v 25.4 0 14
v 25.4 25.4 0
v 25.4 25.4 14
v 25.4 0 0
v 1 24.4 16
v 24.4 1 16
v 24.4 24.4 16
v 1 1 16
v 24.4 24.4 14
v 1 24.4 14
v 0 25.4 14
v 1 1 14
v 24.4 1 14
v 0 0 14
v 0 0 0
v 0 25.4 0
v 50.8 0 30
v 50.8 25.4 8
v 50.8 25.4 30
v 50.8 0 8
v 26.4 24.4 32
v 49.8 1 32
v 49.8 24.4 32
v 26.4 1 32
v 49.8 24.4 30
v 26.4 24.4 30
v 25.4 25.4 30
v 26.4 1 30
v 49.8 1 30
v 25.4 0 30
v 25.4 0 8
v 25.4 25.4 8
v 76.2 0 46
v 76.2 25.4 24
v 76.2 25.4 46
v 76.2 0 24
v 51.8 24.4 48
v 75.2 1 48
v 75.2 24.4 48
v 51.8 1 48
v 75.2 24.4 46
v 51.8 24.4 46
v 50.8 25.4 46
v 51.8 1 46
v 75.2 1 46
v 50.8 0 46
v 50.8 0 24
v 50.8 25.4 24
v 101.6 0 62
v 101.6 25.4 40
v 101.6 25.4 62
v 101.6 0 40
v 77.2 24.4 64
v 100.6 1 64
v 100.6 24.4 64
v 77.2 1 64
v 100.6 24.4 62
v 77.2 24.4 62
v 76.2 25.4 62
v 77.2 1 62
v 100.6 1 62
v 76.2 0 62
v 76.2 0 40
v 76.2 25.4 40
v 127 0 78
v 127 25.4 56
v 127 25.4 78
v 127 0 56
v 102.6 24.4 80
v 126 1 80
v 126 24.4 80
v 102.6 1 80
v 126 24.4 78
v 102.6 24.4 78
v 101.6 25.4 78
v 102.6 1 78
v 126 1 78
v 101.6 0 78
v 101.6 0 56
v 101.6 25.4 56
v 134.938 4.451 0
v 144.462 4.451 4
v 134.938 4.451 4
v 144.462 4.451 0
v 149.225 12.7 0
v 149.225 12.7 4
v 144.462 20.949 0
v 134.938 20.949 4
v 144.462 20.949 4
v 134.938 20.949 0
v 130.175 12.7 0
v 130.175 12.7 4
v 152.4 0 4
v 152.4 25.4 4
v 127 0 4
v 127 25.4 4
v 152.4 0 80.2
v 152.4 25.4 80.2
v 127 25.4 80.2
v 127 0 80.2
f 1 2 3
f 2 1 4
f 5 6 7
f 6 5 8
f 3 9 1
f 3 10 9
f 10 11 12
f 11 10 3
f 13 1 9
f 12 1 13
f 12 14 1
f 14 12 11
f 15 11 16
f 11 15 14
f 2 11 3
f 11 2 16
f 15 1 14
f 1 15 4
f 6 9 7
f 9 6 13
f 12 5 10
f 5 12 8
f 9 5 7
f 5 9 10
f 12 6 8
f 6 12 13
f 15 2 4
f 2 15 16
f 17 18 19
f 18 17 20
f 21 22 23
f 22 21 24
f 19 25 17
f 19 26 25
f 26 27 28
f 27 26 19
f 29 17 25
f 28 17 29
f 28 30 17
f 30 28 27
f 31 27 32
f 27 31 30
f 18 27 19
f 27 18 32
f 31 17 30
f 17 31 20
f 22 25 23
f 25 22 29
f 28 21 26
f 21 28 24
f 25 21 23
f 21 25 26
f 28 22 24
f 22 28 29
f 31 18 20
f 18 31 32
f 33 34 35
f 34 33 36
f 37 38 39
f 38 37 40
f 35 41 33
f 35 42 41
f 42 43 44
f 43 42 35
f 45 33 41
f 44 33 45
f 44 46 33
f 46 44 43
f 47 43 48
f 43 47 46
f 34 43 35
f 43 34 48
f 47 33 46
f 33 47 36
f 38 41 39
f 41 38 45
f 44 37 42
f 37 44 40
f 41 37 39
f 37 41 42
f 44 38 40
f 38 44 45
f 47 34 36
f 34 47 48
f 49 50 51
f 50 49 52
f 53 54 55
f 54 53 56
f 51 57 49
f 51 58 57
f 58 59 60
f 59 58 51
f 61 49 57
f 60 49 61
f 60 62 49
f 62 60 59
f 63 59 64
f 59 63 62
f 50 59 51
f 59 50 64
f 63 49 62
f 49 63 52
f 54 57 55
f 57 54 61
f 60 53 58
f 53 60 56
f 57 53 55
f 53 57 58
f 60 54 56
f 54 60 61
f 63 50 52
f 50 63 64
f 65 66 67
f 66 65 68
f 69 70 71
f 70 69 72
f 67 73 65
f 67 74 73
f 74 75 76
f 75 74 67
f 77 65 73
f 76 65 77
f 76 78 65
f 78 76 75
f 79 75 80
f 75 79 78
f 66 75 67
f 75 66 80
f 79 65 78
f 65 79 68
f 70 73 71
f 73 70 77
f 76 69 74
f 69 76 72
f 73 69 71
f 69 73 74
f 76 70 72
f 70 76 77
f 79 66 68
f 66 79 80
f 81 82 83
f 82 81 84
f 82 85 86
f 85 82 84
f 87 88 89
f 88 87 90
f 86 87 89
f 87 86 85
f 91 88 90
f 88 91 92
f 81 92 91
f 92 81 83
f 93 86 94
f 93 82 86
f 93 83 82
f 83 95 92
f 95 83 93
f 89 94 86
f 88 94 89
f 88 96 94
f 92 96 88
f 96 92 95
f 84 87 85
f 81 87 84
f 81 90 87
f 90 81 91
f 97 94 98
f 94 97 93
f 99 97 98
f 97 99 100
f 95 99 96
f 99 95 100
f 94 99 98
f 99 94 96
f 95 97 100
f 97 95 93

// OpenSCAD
// file: ../DND Play Area Tiles.scad
/**
 * @brief This file contains various types of tiles and other modules for non-assembled/arranged pieces
 * TODO Add textures to tiles
 * TODO Tile square module
 * TODO Tile circle module
 * TODO Basic tile replacement module
 * TODO Wall modules
 */

include <DND Play Area Config.scad>;

/**
 * @brief Basic tile to use for floors
 * @param _center Whether or not to center the tile
 */
module basic_tile(_center=false, _thickness=1) {
    if (DIP_OUTSIDE_SQUARE) {
        difference() {
            // Main tile piece
            cube([SQUARE_SIZE+DIP_DIMENSIONS,SQUARE_SIZE+DIP_DIMENSIONS,TILE_THICKNESS*_thickness],_center);
            // Tile dip
            translate([0,0,(TILE_THICKNESS*_thickness)-DIP_DIMENSIONS])
                difference() {
                    cube([SQUARE_SIZE+DIP_DIMENSIONS,SQUARE_SIZE+DIP_DIMENSIONS,DIP_DIMENSIONS],_center);
                translate([DIP_DIMENSIONS/2,DIP_DIMENSIONS/2,0])
                    cube([SQUARE_SIZE,SQUARE_SIZE,DIP_DIMENSIONS],_center);
                }
        }
    } else {
        difference() {
            // Main tile piece
            cube([SQUARE_SIZE,SQUARE_SIZE,TILE_THICKNESS*_thickness],_center);
            // Tile dip
            translate([0,0,(TILE_THICKNESS*_thickness)-DIP_DIMENSIONS])
                difference() {
                    cube([SQUARE_SIZE,SQUARE_SIZE,DIP_DIMENSIONS],_center);
                    translate([DIP_DIMENSIONS/2,DIP_DIMENSIONS/2,0])
                        cube([SQUARE_SIZE-DIP_DIMENSIONS,SQUARE_SIZE-DIP_DIMENSIONS,DIP_DIMENSIONS],_center);
                }
        }
    }
}

/**
 * @brief This tile can be placed on play areas to link them to other pieces.
 * @param _center Whether or not to center the tile
 * @param _bothsides Whether the connection hole should be on both sides or just the top one
 */
module connection_tile(_center=false,_bothsides=false) {
    translate_amount = DIP_OUTSIDE_SQUARE ? (SQUARE_SIZE+DIP_DIMENSIONS)/2 : SQUARE_SIZE/2;
    difference() {
        basic_tile(_center);
        translate([translate_amount,translate_amount,_bothsides ? 0 : TILE_THICKNESS/2])
            scale([1,1,_bothsides ? 2 : 1])
                connection_shape(_center);
    }
}

/**
 * TODO this should just be an option on the regular connection tile, but for now it'll be here
 */
module flipped_connection_tile() {
    rotate([180,0,0])
        translate([0,-SQUARE_SIZE,-TILE_THICKNESS])
            connection_tile();
}

/**
 * @brief Column for connecting pieces vertically
 * @param _connection_column_height Height of the column in play area squares
 * @param _top_connector If the connection piece on the top should be included
 * @param _bottom_connector If the connection piece on the bottom should be included
 */
module connection_column(_connection_column_height=CONNECTION_COLUMN_HEIGHT,_top_connector=true,_bottom_connector=true) {
    connection_column_height=SQUARE_SIZE*_connection_column_height;
    translate([SQUARE_SIZE/2,SQUARE_SIZE/2,0]) {
        if (_bottom_connector)
            connection_shape();
        translate([0,0,CONNECTION_PEG_HEIGHT+connection_column_height/2])
            cube([SQUARE_SIZE,SQUARE_SIZE,connection_column_height],true);
        if (_top_connector)
            translate([0,0,CONNECTION_PEG_HEIGHT+connection_column_height])
                connection_shape();
    }
}

/**
 * @brief Creates a line of basic tiles of a specified length
 */
module tile_line(_length) {
    for(i=[0:_length-1])
        translate([i*SQUARE_SIZE,0,0])
            basic_tile();
}

/**
 * @brief Creates a rectangle of basic tiles
 */
module tile_rectangle(_length,_width) {
    for(i=[0:_width-1])
        translate([0,i*SQUARE_SIZE,0])
            tile_line(_length);
}

/**
 * @brief Creates a rectangle to fit between two points
 * @param _cordsOne Array(3) of points (x,y,z), used as rectangles home (should be to the right of _cordsTwo
 * @param _cordsTwo Array(3) of points (x,y,z)
 */
module tile_rectangle_between_points(_cordsOne, _cordsTwo) {
    translate(tile_coordinates(_cordsOne[0],_cordsOne[1],_cordsOne[2])) {
        
        rectX = (_cordsOne[0] == _cordsTwo[0]) ? 1 :  abs(_cordsOne[0]-_cordsTwo[0]);
        
        rectY = (_cordsOne[1] == _cordsTwo[1]) ? 1 : abs(_cordsOne[1]-_cordsTwo[1]);
        
        tile_rectangle(rectX,rectY);
    }
}
// file: ../DND Play Area Config.scad
/** Size of each square floor tile */
SQUARE_SIZE = 25.4;
/** Thickness of tiles*/
TILE_THICKNESS = 8;
/** Width and thickness of the dip between tiles */
DIP_DIMENSIONS = TILE_THICKNESS*0.25;
/** Scale of the connection shape to use for the indents into blocks (so that other pieces fit in them) */
CONNECTION_HOLE_SCALE = 1.05;
/** Diameter of the connection holes/pegs */
CONNECTION_PEG_DIAMETER = SQUARE_SIZE*0.75;
/** Height of the connection peg */
CONNECTION_PEG_HEIGHT = TILE_THICKNESS/2;
/** Height of connection columns in number of squares (for multi-level buildings this is the standard height of one floor) */
CONNECTION_COLUMN_HEIGHT = 3;
/** Whether the dip should come outside the square size or if it should be included */
DIP_OUTSIDE_SQUARE = false; // Some things are currently not configured for the dip being outside the square

/**
 * @brief This shape is used to connect various pieces together
 */
module connection_shape(_center=false) {
    cylinder($fn=6,d=CONNECTION_PEG_DIAMETER,h=CONNECTION_PEG_HEIGHT,center=_center);
}

/**
 * @brief Arranges this shape to be cutout of a tile
 */
module cutout_connection_shape(_bothSides=false,_center=false) {
    translate_amount = DIP_OUTSIDE_SQUARE ? (SQUARE_SIZE+DIP_DIMENSIONS)/2 : SQUARE_SIZE/2;
    translate([translate_amount,translate_amount,_bothSides ? 0 : TILE_THICKNESS/2])
        scale([1,1,_bothSides ? 2 : 1])
            connection_shape(_center);
}

/**
 * @brief Converts numbers into tile size for use as coordinates
 */
function tile_coordinates(_x,_y,_z) = [_x*SQUARE_SIZE,_y*SQUARE_SIZE,_z*SQUARE_SIZE];

/**
 * @brief Translates an object using the tile coordinate system
 * @param _point Point to translate to
 */
module tile_translate(_point) {
    for(i=[0:$children-1])
        translate(tile_coordinates(_point[0],_point[1],_point[2]))
            children(i);
}
// main file
/**
 * @brief Contains definitions of various types of stairs
 */

include <../DND Play Area Config.scad>;
use <../DND Play Area Tiles.scad>;

/**
 * @brief Makes a straight staircase
 * @param height Height in play area squares the stairs should reach
 */
module straight_stairs(height) {
    for(i=[0:height-1]) {
        translate(tile_coordinates(i,0,0)) {
            thickness = i == 0 ? 2 : 3;
            translate([0,0,TILE_THICKNESS*2*i-(thickness-2)*TILE_THICKNESS]) {
                basic_tile(_thickness=thickness);
            }
        }
    }
    translate(tile_coordinates(height,0,0))
        connection_column(_connection_column_height=3,_top_connector=false);
}

render()
straight_stairs(5);
